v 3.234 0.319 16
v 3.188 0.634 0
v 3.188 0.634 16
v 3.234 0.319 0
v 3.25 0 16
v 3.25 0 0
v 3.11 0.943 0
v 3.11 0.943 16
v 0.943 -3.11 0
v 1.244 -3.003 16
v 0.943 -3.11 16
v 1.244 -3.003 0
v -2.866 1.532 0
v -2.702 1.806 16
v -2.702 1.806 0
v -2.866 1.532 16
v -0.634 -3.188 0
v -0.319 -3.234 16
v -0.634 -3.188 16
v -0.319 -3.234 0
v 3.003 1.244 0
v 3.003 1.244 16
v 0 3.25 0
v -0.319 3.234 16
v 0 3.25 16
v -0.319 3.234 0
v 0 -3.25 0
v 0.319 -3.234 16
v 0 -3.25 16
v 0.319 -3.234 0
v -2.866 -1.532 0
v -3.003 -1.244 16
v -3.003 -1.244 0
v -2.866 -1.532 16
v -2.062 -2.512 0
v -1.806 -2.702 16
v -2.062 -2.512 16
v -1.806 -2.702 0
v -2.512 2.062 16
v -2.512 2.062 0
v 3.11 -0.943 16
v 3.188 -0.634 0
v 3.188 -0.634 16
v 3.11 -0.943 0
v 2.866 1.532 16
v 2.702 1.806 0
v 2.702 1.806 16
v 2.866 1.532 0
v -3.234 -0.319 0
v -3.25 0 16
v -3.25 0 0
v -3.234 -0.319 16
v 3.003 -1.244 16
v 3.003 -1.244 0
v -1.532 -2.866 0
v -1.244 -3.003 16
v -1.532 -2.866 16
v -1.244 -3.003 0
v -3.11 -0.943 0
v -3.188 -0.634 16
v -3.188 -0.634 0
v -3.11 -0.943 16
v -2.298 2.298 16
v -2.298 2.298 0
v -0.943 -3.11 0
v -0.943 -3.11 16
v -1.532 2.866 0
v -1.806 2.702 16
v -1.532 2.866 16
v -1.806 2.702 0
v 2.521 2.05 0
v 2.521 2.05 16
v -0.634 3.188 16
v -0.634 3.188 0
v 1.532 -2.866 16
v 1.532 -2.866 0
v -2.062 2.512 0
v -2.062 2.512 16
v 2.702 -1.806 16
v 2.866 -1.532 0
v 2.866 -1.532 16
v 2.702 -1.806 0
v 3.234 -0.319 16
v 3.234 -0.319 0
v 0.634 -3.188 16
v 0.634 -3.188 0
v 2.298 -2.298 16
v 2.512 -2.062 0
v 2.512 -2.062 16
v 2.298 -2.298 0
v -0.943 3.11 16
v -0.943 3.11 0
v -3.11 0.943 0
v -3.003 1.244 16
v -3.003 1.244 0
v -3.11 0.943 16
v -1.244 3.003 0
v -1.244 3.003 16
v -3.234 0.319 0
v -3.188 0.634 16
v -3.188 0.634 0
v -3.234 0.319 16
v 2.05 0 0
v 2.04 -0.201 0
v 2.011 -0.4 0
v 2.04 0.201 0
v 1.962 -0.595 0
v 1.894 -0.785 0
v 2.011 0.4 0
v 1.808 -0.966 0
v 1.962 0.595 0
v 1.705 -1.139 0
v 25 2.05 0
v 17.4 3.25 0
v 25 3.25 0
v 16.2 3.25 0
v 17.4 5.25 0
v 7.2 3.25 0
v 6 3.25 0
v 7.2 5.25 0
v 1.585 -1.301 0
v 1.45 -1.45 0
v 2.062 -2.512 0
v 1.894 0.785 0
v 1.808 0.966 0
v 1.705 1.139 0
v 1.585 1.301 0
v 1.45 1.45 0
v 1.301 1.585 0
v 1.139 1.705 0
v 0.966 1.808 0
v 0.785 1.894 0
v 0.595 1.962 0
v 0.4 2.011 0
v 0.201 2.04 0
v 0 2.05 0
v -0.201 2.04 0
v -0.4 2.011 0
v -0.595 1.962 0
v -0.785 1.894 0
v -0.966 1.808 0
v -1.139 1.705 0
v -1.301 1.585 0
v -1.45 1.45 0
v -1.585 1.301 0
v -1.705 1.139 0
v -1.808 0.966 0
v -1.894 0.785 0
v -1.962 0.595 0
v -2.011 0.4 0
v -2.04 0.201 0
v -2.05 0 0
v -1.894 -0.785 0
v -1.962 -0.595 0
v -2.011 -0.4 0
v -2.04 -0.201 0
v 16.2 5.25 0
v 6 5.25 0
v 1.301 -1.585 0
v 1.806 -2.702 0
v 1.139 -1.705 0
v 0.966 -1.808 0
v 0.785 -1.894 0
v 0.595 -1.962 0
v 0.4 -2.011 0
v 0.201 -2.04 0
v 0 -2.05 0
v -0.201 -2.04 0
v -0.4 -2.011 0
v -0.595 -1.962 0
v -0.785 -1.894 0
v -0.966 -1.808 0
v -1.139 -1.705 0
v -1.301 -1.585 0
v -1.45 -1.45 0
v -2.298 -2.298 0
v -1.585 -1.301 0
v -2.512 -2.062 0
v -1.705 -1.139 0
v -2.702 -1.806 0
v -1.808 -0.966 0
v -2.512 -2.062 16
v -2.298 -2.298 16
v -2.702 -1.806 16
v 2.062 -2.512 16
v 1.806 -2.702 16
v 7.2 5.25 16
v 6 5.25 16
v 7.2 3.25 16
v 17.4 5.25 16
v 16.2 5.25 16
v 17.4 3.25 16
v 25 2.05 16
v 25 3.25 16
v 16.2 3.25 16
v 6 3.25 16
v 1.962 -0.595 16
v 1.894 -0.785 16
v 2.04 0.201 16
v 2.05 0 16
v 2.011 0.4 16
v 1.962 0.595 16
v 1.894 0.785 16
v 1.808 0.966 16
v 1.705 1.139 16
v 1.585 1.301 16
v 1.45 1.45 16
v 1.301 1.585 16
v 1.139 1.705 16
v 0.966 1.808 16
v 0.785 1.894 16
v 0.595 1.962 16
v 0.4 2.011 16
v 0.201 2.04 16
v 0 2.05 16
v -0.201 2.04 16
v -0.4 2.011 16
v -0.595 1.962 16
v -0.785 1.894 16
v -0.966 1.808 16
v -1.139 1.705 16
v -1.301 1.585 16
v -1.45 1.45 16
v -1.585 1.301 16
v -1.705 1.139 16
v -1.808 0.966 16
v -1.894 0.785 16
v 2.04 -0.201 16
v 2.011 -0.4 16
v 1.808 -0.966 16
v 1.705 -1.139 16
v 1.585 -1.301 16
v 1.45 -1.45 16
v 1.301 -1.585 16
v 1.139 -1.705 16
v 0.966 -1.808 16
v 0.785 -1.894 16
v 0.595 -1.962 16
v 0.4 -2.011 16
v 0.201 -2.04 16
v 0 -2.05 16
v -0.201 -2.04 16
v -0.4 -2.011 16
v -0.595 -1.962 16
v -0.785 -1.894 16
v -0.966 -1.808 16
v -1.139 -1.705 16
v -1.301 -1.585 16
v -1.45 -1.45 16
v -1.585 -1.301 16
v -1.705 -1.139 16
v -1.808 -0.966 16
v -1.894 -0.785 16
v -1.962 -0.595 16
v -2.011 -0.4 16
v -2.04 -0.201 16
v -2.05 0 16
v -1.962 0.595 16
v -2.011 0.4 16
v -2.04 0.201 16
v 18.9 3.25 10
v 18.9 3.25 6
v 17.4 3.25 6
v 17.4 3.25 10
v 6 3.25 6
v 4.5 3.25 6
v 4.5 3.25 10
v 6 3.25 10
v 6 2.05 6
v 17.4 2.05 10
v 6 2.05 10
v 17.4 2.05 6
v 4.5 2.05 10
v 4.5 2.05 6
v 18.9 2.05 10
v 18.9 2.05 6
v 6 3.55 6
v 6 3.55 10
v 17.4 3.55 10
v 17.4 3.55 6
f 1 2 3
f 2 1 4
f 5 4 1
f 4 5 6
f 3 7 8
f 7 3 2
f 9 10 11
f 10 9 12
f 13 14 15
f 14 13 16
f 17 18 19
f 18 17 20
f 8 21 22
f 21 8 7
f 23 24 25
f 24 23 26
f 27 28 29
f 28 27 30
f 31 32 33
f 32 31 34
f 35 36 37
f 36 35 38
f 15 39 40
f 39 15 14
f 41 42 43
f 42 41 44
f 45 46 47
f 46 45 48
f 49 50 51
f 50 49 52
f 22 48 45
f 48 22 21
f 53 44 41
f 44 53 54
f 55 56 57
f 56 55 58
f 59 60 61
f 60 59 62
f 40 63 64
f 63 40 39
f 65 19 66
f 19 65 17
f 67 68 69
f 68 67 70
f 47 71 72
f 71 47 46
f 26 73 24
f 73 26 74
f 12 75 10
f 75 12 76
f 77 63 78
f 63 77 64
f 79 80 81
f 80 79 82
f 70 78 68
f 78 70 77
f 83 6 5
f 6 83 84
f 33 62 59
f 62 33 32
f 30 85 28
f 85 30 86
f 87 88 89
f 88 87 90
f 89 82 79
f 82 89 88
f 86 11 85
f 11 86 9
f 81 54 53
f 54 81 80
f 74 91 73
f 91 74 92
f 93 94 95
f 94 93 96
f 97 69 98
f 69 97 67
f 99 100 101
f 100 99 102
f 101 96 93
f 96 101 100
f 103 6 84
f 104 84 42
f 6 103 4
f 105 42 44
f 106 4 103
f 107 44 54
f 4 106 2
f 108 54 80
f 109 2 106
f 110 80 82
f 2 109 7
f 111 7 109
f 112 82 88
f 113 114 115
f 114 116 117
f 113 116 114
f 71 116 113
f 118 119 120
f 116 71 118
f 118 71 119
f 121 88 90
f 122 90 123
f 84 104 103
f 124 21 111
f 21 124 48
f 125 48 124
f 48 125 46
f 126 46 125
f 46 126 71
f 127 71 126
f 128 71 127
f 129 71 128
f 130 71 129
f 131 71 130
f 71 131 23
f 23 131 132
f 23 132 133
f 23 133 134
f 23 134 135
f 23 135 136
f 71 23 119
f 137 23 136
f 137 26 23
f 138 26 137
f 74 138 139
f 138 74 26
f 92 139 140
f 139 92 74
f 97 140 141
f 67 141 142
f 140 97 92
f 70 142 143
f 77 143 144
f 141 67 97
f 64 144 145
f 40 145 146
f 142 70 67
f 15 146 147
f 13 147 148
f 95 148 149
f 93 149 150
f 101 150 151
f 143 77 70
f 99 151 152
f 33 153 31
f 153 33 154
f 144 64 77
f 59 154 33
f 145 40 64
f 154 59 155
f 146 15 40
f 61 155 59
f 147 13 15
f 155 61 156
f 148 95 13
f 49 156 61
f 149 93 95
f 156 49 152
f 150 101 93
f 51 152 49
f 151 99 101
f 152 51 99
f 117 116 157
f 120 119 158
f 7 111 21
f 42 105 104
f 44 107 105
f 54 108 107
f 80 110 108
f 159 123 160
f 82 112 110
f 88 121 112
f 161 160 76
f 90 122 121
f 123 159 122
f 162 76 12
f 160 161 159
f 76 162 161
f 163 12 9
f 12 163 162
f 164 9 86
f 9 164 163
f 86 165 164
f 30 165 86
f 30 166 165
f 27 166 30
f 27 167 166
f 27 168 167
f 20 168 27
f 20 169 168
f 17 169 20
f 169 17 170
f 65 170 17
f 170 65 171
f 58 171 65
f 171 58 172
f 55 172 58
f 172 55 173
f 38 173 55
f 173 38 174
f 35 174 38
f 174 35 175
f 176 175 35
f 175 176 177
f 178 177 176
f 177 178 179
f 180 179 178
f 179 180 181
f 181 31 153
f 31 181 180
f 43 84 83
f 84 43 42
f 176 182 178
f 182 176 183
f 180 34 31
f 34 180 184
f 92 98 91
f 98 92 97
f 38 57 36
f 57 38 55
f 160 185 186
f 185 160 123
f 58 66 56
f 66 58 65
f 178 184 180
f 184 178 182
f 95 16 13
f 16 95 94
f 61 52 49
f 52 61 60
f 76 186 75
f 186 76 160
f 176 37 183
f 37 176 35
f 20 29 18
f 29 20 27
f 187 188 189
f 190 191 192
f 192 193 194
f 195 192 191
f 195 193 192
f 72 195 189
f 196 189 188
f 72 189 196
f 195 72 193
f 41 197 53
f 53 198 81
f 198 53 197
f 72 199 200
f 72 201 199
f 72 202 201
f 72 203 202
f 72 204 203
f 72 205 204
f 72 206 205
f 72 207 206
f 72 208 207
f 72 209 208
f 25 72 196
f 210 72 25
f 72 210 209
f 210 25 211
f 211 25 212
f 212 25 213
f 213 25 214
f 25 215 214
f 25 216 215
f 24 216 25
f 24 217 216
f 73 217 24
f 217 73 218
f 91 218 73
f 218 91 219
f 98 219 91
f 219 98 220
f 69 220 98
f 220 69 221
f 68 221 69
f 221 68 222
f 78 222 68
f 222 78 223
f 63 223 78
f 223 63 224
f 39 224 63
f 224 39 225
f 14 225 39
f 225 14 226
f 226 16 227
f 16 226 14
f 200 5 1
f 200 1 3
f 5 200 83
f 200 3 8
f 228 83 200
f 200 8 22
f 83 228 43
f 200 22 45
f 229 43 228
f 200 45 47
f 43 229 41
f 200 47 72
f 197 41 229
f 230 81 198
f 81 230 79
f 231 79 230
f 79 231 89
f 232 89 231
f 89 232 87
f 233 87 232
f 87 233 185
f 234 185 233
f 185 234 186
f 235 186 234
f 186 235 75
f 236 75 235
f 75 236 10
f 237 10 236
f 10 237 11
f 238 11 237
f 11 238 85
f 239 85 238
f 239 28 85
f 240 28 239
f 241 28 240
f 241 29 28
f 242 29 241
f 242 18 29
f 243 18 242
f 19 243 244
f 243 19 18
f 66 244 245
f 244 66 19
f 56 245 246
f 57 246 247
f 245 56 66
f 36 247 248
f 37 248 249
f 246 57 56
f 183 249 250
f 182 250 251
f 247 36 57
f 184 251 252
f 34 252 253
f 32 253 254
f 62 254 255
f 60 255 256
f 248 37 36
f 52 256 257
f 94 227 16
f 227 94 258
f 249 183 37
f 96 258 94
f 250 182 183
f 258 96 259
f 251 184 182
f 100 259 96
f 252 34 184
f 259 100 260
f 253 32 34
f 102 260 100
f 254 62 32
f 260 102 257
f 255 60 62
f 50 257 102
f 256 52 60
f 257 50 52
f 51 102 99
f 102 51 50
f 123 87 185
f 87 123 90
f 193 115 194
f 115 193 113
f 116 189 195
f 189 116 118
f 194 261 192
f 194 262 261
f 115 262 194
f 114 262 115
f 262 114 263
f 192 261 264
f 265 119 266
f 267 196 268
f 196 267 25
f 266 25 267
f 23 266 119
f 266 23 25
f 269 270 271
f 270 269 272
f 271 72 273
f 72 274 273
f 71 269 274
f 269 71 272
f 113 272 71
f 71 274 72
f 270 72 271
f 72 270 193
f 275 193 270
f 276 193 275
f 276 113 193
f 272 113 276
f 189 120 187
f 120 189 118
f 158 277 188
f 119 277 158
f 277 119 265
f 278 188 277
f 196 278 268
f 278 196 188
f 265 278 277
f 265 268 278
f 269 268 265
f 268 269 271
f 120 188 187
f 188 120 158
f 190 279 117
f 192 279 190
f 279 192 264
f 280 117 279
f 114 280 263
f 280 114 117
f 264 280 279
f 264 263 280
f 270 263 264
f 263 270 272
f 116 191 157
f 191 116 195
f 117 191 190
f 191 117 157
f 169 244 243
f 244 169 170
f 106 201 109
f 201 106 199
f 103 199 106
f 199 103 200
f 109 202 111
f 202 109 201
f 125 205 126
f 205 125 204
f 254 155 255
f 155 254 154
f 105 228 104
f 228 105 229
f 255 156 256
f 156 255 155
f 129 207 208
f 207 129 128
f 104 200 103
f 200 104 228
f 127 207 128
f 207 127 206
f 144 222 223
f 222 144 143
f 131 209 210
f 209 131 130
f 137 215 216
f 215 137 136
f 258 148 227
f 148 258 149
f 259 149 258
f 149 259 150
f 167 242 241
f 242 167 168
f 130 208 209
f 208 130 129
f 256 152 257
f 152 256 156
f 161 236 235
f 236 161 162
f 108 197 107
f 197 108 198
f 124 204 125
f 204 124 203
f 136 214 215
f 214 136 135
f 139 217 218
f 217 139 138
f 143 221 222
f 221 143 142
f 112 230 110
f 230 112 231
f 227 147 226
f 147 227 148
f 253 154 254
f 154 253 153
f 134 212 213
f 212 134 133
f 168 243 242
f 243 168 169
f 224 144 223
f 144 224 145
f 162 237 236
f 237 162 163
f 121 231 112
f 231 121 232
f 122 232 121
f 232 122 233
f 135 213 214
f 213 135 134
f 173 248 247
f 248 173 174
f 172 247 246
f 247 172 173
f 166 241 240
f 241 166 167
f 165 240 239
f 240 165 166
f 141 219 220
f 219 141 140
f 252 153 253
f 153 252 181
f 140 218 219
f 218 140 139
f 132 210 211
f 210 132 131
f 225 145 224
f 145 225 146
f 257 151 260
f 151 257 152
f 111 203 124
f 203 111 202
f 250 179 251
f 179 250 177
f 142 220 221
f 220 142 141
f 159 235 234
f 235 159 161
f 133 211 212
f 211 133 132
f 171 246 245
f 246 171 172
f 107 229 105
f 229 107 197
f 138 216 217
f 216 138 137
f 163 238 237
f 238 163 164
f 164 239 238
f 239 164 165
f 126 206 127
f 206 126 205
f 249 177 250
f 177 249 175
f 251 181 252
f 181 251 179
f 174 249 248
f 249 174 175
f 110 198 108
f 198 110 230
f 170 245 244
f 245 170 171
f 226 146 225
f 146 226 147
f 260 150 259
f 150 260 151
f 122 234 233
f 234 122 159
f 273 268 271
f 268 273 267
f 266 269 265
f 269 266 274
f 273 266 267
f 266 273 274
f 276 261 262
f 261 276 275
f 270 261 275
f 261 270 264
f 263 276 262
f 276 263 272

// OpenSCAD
standoff_diameter = 4.1;

$fn = 64;

difference() {
    union() {
        cylinder(d = standoff_diameter + 2.4, h = 16);
        translate([0 ,(standoff_diameter) / 2, 0]) cube([25, 1.2, 16]);
        translate([6, standoff_diameter / 2 + 1.2, 0]) cube([1.2, 2, 16]);
        translate([6 + 9 + 1.2, standoff_diameter / 2 + 1.2, 0]) cube([1.2, 2, 16]);
    }
    translate([0, 0, -0.1]) cylinder(d = standoff_diameter, h = 16.2);
    
    translate([4.5, standoff_diameter / 2 - 0.5, 6]) cube([1.5, 2, 4]);
    translate([17.4, standoff_diameter / 2 - 0.5, 6]) cube([1.5, 2, 4]);
}
